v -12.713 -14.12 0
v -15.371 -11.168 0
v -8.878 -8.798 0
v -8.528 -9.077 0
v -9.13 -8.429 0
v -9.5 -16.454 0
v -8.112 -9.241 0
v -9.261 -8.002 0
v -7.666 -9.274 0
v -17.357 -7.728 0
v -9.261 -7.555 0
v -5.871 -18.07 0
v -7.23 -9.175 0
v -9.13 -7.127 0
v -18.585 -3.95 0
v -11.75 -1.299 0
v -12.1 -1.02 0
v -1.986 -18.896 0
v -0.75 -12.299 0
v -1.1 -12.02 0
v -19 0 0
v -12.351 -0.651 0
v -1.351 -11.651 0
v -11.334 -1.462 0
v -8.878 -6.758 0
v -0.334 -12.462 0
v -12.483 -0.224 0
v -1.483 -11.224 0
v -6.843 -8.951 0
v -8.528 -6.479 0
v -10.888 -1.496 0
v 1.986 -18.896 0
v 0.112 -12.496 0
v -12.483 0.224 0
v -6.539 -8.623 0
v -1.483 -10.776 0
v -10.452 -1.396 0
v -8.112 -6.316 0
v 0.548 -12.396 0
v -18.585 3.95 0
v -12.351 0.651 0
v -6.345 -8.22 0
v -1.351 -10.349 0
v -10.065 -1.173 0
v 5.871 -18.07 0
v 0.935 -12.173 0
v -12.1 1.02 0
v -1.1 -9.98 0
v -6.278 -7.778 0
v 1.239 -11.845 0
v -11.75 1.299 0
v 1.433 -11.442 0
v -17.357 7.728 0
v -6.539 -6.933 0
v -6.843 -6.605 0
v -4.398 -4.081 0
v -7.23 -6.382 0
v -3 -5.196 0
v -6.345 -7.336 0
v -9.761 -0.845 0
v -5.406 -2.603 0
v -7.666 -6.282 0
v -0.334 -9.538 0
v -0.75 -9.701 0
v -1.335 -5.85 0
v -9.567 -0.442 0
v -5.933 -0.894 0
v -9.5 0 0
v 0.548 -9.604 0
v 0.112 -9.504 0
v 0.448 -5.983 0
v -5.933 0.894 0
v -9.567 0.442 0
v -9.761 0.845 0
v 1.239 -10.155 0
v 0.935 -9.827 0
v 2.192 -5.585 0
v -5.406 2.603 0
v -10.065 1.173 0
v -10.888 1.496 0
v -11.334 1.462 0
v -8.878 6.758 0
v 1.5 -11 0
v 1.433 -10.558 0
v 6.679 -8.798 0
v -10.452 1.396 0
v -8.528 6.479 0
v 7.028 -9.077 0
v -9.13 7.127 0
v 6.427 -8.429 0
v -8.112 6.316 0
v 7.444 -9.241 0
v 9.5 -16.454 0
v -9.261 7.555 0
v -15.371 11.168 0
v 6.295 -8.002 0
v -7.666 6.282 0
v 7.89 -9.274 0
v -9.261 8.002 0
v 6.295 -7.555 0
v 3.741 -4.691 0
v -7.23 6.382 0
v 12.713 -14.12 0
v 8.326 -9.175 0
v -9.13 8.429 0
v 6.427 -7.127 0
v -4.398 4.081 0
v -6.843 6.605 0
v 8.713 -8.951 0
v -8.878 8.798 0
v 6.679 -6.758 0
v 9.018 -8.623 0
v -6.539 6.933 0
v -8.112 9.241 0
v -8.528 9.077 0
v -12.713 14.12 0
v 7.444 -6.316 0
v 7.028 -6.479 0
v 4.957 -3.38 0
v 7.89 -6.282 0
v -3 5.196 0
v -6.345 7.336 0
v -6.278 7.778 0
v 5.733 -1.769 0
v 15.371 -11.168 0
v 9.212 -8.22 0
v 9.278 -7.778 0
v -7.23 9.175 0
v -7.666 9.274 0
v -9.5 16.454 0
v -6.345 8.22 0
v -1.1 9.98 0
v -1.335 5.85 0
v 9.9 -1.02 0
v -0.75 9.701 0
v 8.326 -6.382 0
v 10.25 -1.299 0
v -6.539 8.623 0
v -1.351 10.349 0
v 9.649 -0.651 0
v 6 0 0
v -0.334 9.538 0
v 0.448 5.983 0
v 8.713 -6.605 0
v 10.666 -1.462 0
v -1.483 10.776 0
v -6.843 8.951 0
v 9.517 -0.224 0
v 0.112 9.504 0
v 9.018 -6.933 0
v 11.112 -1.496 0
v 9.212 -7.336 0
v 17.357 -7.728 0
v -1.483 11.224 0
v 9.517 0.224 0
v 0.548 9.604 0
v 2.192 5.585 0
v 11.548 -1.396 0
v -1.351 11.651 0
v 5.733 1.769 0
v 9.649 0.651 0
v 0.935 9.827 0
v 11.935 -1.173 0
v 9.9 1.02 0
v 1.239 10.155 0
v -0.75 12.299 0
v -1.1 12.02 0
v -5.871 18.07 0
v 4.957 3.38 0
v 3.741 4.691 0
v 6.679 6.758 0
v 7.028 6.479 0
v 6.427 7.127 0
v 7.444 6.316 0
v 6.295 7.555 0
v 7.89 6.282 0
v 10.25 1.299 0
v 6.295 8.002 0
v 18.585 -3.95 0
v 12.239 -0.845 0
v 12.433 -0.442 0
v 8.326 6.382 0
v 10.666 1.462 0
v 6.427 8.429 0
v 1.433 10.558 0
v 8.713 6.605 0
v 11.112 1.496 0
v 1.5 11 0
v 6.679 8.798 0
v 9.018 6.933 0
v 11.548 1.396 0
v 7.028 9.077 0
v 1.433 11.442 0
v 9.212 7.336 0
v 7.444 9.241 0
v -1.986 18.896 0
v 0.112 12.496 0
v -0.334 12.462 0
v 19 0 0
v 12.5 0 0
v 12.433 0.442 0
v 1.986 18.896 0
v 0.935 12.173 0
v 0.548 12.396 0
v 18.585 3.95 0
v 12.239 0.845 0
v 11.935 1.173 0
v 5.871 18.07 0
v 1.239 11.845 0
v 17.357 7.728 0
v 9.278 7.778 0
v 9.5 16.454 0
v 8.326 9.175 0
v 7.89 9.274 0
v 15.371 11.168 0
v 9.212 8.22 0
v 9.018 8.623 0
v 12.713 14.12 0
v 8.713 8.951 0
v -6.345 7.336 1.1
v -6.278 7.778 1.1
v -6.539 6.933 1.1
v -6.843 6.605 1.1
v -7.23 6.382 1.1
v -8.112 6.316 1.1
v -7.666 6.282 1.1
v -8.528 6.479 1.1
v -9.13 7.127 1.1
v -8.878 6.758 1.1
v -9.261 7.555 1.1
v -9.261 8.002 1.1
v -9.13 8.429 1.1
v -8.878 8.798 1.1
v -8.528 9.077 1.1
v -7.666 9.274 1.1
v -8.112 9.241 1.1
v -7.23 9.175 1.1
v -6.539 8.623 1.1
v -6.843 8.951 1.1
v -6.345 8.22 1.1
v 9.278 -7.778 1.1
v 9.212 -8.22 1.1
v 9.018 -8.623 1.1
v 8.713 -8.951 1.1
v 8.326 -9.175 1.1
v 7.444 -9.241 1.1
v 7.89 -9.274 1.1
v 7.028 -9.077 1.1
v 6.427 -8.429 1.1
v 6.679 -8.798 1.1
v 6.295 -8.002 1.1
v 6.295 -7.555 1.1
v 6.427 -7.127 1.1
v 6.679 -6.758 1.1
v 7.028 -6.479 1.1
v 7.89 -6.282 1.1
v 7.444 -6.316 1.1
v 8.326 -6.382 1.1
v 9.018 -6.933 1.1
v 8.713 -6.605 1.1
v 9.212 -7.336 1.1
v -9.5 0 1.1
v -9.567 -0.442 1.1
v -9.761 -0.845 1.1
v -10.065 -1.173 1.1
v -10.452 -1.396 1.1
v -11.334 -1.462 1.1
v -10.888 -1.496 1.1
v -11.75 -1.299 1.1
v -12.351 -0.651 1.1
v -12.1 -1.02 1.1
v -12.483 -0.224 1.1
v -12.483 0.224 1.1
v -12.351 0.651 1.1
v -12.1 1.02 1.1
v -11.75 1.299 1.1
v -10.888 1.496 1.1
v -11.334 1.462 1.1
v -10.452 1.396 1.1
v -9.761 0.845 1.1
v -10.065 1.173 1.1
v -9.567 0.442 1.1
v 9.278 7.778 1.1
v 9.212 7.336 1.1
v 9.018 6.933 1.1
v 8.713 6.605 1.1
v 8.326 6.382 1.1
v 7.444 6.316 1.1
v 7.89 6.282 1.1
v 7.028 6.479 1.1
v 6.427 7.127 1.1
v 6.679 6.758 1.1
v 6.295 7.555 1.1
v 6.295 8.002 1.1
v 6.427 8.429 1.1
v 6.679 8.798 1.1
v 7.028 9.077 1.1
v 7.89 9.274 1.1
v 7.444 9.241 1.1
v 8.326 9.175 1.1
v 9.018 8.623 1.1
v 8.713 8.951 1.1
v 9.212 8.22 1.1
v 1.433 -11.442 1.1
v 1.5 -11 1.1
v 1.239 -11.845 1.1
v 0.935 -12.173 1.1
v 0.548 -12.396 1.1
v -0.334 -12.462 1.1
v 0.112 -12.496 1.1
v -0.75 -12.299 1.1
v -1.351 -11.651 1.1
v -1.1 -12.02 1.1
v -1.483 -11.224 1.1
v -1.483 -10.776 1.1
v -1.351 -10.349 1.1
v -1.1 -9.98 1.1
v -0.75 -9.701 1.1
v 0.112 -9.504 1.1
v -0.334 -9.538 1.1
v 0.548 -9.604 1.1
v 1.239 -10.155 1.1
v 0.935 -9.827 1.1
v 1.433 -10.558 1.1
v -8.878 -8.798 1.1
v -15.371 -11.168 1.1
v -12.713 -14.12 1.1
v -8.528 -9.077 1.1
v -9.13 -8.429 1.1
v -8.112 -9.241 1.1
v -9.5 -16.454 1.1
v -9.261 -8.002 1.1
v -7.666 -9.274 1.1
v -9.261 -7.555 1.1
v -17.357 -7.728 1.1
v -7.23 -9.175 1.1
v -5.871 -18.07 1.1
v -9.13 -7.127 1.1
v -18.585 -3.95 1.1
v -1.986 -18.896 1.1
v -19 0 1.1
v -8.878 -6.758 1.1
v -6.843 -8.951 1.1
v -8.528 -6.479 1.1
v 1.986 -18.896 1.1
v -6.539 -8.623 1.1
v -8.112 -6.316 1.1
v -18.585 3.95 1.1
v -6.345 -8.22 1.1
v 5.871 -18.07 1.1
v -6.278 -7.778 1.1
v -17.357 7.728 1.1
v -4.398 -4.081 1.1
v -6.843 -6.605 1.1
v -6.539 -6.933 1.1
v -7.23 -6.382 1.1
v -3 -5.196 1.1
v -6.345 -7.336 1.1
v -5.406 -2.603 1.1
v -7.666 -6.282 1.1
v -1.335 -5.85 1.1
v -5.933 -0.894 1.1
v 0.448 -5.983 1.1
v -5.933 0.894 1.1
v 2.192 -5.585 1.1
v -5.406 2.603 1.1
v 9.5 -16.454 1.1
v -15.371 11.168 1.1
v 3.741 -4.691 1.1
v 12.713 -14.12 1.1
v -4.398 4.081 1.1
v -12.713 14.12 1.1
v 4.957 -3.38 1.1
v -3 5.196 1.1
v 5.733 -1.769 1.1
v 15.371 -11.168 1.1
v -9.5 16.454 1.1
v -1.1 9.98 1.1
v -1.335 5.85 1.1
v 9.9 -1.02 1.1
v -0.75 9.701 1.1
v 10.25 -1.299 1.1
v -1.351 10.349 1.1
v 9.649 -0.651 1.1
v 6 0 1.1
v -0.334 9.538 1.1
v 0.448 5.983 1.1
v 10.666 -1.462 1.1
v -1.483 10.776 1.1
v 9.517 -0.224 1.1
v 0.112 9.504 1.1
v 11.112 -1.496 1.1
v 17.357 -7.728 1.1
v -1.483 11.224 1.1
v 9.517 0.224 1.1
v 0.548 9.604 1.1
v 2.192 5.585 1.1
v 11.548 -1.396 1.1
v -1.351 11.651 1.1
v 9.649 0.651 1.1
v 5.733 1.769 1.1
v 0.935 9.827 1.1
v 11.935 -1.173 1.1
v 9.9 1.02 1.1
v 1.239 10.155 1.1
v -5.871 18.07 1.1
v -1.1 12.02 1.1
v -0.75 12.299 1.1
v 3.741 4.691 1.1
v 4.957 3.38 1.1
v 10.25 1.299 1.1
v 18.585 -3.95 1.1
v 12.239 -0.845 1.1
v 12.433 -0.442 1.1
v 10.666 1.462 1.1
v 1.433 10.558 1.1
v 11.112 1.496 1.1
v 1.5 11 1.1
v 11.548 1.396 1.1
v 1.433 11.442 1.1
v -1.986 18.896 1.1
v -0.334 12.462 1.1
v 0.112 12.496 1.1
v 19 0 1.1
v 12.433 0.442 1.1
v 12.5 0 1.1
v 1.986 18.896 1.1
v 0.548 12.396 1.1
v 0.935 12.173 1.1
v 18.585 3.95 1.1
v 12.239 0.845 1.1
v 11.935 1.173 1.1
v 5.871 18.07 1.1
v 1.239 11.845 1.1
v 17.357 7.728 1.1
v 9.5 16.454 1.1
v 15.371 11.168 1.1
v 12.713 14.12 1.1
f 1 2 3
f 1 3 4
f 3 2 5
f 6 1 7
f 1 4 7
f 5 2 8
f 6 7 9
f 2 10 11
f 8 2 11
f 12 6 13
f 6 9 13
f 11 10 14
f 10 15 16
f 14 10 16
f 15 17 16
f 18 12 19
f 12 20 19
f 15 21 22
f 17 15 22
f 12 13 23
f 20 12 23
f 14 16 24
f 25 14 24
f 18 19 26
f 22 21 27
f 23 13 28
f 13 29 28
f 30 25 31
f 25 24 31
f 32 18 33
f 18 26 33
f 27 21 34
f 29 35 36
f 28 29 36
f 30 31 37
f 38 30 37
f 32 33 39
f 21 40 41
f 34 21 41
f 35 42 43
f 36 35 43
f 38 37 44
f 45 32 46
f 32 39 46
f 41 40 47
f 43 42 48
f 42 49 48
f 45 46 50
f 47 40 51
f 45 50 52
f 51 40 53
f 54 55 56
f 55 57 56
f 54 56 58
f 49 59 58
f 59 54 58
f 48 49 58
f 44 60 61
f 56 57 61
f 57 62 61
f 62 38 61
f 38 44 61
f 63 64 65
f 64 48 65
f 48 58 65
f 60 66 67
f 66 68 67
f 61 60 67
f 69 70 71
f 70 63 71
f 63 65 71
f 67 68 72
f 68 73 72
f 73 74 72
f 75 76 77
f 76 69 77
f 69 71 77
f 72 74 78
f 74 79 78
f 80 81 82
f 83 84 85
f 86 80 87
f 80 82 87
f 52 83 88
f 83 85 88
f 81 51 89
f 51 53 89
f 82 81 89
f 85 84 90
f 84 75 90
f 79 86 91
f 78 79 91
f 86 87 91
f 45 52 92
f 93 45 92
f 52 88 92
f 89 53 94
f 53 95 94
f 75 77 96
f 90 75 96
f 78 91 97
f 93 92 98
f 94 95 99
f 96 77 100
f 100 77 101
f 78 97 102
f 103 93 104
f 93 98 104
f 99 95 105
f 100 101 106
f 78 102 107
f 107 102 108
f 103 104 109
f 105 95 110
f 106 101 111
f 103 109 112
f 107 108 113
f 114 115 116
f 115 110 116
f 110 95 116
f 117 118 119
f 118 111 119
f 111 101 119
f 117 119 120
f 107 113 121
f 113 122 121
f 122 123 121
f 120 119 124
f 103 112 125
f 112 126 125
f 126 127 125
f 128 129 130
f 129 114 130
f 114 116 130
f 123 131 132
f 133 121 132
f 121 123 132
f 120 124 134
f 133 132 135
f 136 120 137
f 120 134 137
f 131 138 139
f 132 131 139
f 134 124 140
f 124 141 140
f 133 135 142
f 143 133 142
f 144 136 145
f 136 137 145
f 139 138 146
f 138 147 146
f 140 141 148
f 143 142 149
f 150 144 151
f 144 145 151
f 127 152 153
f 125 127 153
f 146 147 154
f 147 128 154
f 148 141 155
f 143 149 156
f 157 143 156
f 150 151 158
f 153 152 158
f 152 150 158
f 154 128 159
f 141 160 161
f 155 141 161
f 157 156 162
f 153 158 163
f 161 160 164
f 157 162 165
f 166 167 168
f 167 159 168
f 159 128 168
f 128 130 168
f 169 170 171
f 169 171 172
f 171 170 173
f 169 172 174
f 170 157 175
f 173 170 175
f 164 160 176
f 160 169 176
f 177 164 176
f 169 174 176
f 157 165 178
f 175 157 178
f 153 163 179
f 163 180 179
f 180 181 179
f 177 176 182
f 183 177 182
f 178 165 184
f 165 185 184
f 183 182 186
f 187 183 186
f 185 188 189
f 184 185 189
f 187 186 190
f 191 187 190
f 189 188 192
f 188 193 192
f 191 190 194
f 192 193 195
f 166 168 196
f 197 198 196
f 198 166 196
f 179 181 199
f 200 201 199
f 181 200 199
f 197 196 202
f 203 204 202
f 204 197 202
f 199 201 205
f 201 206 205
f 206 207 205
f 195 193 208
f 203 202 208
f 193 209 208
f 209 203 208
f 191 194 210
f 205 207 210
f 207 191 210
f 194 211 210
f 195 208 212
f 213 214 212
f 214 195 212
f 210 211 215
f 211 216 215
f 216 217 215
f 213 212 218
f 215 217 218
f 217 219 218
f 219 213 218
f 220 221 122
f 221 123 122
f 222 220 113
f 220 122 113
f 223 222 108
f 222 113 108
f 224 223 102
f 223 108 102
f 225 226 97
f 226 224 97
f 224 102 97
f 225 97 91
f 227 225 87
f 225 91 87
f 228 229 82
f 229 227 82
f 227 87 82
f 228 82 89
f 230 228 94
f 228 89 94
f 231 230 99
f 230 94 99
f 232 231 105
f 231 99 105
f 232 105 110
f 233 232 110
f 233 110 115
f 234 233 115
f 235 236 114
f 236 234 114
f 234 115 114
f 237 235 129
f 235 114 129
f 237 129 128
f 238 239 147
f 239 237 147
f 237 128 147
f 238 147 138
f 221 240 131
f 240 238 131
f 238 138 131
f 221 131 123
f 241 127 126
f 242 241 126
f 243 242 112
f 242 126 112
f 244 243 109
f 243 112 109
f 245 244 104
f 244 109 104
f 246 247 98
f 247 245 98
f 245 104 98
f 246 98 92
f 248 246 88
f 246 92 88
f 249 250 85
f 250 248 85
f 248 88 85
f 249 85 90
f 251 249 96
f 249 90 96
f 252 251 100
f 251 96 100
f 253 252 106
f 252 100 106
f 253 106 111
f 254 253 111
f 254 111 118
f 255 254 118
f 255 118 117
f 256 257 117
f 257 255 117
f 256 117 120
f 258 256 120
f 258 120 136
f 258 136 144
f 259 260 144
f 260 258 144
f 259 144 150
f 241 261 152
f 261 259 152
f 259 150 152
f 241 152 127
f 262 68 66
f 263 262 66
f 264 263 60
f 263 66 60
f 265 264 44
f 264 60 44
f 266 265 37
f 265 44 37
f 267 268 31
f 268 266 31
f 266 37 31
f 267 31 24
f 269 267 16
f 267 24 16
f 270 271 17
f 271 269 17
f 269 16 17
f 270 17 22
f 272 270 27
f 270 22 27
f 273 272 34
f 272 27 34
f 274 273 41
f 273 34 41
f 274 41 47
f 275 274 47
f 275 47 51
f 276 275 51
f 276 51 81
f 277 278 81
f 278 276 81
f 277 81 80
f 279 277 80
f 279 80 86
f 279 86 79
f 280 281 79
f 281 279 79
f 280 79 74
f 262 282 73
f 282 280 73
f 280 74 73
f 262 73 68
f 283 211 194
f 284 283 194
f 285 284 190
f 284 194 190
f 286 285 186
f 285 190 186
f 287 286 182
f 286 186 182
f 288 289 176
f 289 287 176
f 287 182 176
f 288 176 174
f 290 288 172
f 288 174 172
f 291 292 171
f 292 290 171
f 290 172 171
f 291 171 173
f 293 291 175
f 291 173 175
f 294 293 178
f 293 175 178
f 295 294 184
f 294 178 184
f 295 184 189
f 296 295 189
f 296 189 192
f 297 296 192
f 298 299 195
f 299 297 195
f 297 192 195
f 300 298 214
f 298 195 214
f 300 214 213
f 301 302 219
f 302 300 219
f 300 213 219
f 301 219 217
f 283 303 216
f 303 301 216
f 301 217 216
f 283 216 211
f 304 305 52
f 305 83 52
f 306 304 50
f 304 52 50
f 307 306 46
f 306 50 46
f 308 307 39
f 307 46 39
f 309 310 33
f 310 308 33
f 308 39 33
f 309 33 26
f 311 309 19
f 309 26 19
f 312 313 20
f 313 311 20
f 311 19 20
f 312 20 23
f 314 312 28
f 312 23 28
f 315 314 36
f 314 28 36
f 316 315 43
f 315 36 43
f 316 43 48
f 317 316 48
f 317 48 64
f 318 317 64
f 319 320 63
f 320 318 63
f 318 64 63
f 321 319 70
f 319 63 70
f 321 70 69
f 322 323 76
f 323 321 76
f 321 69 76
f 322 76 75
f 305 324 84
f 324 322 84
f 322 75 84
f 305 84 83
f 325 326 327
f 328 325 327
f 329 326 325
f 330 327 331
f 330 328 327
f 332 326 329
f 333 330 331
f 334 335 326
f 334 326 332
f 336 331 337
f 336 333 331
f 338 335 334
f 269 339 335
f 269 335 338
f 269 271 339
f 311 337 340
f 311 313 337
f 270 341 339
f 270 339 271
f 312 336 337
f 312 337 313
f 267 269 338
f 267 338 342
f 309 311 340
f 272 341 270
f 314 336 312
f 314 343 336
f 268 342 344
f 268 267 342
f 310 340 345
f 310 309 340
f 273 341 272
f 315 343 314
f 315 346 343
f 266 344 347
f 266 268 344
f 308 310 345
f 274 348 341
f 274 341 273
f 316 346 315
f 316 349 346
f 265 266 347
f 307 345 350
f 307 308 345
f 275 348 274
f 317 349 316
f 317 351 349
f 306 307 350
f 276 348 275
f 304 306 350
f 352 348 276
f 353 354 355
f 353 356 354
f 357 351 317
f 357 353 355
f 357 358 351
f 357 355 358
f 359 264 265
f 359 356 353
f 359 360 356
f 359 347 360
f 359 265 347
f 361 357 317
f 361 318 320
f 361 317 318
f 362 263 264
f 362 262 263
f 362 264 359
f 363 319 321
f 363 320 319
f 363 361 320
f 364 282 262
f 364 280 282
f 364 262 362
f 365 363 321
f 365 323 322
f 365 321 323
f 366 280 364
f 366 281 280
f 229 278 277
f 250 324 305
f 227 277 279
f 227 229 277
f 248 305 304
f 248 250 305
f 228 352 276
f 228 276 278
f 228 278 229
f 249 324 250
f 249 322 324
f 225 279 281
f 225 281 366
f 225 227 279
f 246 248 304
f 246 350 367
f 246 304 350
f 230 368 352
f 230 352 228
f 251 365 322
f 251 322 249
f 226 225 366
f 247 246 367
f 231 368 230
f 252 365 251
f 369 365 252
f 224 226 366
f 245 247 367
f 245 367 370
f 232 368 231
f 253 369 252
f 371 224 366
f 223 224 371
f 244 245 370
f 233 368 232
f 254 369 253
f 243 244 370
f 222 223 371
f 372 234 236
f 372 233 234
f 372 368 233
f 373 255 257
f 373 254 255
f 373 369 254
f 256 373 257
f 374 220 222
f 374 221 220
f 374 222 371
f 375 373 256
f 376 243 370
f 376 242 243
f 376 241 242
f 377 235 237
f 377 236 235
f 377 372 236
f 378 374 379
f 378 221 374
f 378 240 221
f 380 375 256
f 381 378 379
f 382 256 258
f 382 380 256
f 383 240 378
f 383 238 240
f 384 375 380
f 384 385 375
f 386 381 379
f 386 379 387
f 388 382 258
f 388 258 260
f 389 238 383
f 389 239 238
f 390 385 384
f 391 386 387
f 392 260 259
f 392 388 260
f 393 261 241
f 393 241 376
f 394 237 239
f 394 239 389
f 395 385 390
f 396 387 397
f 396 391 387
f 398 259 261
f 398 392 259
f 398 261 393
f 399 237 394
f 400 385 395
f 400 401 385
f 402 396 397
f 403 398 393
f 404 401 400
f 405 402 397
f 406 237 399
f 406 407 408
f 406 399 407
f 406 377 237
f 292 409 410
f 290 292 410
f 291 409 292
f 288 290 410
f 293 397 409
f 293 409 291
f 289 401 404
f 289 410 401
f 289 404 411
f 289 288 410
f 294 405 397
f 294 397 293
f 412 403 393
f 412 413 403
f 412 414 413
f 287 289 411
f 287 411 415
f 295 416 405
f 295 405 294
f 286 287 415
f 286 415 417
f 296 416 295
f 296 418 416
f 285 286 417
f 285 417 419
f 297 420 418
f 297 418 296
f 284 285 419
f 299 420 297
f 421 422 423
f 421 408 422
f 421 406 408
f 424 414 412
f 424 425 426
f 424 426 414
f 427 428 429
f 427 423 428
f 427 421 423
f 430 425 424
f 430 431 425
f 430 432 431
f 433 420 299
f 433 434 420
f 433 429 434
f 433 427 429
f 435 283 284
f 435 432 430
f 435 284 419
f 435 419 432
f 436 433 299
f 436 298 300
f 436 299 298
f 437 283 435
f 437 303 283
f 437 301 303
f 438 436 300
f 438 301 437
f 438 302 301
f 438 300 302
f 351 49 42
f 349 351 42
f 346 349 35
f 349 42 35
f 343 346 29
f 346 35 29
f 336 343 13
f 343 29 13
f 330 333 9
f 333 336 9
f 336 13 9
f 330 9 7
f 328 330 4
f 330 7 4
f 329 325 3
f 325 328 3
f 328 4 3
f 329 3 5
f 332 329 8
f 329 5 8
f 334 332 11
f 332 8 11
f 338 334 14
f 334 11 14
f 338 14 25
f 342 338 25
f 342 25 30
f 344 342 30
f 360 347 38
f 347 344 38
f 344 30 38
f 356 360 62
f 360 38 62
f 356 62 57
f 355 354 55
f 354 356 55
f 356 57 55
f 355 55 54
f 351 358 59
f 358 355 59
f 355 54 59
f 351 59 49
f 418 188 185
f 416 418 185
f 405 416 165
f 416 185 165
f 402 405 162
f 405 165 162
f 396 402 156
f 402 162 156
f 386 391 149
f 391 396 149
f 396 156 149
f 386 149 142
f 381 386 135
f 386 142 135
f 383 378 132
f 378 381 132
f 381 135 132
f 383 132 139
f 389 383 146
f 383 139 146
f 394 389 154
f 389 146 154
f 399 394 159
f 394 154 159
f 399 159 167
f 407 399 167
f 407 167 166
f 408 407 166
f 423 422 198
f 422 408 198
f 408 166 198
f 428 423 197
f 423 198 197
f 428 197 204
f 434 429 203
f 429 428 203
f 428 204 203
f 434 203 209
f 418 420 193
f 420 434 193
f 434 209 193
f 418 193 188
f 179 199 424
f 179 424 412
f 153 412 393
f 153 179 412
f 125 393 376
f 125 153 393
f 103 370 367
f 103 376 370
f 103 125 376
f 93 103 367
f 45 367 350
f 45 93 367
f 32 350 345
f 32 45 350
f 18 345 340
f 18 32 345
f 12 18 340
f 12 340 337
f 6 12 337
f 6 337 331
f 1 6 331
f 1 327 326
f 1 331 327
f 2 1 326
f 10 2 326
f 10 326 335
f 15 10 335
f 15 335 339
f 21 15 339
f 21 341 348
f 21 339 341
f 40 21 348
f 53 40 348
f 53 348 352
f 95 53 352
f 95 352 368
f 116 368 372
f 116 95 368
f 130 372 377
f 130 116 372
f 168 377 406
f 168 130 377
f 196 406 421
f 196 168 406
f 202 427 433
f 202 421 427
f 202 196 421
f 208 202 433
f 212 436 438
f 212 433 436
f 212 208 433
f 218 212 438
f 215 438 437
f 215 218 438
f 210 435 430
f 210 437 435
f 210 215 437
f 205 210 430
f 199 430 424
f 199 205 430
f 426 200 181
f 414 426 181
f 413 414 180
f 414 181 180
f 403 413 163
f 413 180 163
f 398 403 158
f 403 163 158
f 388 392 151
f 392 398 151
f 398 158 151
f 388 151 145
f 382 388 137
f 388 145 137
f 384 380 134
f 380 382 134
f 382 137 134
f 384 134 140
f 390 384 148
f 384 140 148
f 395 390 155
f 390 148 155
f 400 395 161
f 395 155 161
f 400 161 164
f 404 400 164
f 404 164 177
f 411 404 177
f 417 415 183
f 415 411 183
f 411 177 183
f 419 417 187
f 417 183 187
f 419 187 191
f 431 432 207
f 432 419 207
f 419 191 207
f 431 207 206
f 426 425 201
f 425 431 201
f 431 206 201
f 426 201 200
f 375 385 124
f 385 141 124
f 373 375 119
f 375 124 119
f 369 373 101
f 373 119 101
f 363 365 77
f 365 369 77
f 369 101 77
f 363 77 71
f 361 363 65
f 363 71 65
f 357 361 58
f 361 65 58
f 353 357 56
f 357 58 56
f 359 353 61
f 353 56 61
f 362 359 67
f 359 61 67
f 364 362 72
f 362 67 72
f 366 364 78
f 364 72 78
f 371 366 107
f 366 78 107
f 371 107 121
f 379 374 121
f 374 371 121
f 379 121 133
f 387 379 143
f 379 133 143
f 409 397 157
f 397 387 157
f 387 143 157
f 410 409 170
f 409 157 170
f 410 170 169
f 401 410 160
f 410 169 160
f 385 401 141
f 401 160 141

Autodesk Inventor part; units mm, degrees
ref_plane "YZ Plane" through (0, 0, 0) normal (1, 0, 0) x (0, 1, 0)
ref_plane "XZ Plane" through (0, 0, 0) normal (0, 1, 0) x (-1, 0, 0)
ref_plane "XY Plane" through (0, 0, 0) normal (0, 0, 1) x (1, 0, 0)
sketch "Sketch1" plane through (0, 0, 0) normal (0, 0, 1) x (1, 0, 0)
  line L0 (-13, -11) -> (13, -11) construction
  circle A0 centre (0, 0) radius 13.8 construction
  circle A1 centre (0, 0) radius 5 construction
  circle A2 centre (0, -11) radius 1.2813 construction
  circle A3 centre (-7.7782, -7.7782) radius 1.2813 construction
  circle A4 centre (-11, 0) radius 1.2813 construction
  circle A5 centre (-7.7782, 7.7782) radius 1.2813 construction
  circle A6 centre (0, 11) radius 1.2813 construction
  circle A7 centre (7.7782, 7.7782) radius 1.2813 construction
  circle A8 centre (11, 0) radius 1.2813 construction
  circle A9 centre (7.7782, -7.7782) radius 1.2813 construction
  circle A10 centre (0, -8) radius 1.2 construction
  circle A11 centre (-8, 0) radius 1.2 construction
  circle A12 centre (0, 8) radius 1.2 construction
  circle A13 centre (8, 0) radius 1.2 construction
  circle A14 centre (0, -11) radius 1.5
  circle A15 centre (7.7782, -7.7782) radius 1.5
  circle A16 centre (11, 0) radius 1.5
  circle A17 centre (7.7782, 7.7782) radius 1.5
  circle A18 centre (0, 11) radius 1.5
  circle A19 centre (-7.7782, 7.7782) radius 1.5
  circle A20 centre (-11, 0) radius 1.5
  circle A21 centre (-7.7782, -7.7782) radius 1.5
  circle A22 centre (0, 0) radius 6
  circle A23 centre (0, 0) radius 19
  dimension "d0" = 3
  dimension "d3" = 360
  dimension "d5" = 12
  dimension "d6" = 38
extrude "Extrusion1" add sketch "Sketch1" along normal blind 1.1
properties part number "motor_spacer_leg"
